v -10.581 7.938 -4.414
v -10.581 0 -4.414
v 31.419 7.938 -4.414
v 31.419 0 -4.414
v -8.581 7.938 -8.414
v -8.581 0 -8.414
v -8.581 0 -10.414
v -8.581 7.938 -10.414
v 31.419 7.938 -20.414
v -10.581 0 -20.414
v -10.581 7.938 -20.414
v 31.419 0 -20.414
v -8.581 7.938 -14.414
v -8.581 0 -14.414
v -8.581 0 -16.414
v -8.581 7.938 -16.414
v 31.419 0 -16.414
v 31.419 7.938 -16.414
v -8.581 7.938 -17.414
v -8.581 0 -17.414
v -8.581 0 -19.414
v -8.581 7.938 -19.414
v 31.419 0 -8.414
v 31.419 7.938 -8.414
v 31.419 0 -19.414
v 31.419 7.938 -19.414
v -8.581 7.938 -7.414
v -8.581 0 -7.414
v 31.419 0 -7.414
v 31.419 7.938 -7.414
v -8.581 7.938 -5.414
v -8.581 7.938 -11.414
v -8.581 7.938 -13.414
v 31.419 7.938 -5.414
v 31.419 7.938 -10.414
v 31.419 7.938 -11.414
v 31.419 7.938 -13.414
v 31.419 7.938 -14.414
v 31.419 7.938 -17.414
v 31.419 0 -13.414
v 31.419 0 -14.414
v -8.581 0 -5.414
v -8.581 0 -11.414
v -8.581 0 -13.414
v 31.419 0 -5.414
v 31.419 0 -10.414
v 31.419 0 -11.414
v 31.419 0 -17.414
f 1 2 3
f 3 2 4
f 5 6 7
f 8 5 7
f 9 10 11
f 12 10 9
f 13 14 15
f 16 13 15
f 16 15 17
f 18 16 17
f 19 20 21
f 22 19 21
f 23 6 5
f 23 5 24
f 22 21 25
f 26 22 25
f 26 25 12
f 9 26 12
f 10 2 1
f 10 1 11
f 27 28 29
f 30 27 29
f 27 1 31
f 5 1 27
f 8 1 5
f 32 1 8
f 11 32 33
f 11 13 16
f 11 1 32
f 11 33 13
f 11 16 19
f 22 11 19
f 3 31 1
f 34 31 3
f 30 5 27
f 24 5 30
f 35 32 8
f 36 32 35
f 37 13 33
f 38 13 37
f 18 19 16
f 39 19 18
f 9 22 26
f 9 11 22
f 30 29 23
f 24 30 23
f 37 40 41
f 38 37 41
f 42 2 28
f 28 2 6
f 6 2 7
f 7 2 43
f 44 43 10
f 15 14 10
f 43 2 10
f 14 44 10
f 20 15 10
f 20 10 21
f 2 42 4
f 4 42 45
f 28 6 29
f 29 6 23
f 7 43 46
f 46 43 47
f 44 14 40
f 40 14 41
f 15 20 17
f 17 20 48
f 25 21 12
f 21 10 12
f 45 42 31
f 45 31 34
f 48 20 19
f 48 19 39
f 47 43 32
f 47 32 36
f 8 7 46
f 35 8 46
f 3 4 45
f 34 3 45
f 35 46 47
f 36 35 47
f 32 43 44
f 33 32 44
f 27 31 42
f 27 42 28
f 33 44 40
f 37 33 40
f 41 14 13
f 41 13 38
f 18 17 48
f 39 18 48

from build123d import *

# Parameters (mm, degrees)
SKETCH1_W           = 2
SKETCH1_H           = 16
BOSS_EXTRUDE1_DEPTH = 7.9375
SKETCH1_4_W         = 40
SKETCH1_4_H         = 1
BOSS_EXTRUDE2_DEPTH = 7.9375
LPATTERN1_COUNT     = 6
LPATTERN1_PITCH     = 3


with BuildPart() as part:
    # Sketch1 → Boss-Extrude1 (new body)
    with BuildSketch(Plane(origin=(0, 0, 0), x_dir=(1, 0, 0), z_dir=(0, 1, 0))):
        with Locations((-9.581037754, 12.413793103)):
            Rectangle(SKETCH1_W, SKETCH1_H)
    extrude(amount=BOSS_EXTRUDE1_DEPTH)

    # Sketch1<4> → Boss-Extrude2 (add)
    with BuildSketch(Plane(origin=(0, 0, 0), x_dir=(1, 0, 0), z_dir=(0, 1, 0))):
        with Locations((11.418962246, 19.913793103)):
            Rectangle(SKETCH1_4_W, SKETCH1_4_H)
    boss_extrude2 = extrude(amount=BOSS_EXTRUDE2_DEPTH)

    # LPattern1: Boss-Extrude2 ×6
    with Locations(*[(0, 0, i * LPATTERN1_PITCH) for i in range(1, LPATTERN1_COUNT)]):
        add(boss_extrude2)


solid = part.part
